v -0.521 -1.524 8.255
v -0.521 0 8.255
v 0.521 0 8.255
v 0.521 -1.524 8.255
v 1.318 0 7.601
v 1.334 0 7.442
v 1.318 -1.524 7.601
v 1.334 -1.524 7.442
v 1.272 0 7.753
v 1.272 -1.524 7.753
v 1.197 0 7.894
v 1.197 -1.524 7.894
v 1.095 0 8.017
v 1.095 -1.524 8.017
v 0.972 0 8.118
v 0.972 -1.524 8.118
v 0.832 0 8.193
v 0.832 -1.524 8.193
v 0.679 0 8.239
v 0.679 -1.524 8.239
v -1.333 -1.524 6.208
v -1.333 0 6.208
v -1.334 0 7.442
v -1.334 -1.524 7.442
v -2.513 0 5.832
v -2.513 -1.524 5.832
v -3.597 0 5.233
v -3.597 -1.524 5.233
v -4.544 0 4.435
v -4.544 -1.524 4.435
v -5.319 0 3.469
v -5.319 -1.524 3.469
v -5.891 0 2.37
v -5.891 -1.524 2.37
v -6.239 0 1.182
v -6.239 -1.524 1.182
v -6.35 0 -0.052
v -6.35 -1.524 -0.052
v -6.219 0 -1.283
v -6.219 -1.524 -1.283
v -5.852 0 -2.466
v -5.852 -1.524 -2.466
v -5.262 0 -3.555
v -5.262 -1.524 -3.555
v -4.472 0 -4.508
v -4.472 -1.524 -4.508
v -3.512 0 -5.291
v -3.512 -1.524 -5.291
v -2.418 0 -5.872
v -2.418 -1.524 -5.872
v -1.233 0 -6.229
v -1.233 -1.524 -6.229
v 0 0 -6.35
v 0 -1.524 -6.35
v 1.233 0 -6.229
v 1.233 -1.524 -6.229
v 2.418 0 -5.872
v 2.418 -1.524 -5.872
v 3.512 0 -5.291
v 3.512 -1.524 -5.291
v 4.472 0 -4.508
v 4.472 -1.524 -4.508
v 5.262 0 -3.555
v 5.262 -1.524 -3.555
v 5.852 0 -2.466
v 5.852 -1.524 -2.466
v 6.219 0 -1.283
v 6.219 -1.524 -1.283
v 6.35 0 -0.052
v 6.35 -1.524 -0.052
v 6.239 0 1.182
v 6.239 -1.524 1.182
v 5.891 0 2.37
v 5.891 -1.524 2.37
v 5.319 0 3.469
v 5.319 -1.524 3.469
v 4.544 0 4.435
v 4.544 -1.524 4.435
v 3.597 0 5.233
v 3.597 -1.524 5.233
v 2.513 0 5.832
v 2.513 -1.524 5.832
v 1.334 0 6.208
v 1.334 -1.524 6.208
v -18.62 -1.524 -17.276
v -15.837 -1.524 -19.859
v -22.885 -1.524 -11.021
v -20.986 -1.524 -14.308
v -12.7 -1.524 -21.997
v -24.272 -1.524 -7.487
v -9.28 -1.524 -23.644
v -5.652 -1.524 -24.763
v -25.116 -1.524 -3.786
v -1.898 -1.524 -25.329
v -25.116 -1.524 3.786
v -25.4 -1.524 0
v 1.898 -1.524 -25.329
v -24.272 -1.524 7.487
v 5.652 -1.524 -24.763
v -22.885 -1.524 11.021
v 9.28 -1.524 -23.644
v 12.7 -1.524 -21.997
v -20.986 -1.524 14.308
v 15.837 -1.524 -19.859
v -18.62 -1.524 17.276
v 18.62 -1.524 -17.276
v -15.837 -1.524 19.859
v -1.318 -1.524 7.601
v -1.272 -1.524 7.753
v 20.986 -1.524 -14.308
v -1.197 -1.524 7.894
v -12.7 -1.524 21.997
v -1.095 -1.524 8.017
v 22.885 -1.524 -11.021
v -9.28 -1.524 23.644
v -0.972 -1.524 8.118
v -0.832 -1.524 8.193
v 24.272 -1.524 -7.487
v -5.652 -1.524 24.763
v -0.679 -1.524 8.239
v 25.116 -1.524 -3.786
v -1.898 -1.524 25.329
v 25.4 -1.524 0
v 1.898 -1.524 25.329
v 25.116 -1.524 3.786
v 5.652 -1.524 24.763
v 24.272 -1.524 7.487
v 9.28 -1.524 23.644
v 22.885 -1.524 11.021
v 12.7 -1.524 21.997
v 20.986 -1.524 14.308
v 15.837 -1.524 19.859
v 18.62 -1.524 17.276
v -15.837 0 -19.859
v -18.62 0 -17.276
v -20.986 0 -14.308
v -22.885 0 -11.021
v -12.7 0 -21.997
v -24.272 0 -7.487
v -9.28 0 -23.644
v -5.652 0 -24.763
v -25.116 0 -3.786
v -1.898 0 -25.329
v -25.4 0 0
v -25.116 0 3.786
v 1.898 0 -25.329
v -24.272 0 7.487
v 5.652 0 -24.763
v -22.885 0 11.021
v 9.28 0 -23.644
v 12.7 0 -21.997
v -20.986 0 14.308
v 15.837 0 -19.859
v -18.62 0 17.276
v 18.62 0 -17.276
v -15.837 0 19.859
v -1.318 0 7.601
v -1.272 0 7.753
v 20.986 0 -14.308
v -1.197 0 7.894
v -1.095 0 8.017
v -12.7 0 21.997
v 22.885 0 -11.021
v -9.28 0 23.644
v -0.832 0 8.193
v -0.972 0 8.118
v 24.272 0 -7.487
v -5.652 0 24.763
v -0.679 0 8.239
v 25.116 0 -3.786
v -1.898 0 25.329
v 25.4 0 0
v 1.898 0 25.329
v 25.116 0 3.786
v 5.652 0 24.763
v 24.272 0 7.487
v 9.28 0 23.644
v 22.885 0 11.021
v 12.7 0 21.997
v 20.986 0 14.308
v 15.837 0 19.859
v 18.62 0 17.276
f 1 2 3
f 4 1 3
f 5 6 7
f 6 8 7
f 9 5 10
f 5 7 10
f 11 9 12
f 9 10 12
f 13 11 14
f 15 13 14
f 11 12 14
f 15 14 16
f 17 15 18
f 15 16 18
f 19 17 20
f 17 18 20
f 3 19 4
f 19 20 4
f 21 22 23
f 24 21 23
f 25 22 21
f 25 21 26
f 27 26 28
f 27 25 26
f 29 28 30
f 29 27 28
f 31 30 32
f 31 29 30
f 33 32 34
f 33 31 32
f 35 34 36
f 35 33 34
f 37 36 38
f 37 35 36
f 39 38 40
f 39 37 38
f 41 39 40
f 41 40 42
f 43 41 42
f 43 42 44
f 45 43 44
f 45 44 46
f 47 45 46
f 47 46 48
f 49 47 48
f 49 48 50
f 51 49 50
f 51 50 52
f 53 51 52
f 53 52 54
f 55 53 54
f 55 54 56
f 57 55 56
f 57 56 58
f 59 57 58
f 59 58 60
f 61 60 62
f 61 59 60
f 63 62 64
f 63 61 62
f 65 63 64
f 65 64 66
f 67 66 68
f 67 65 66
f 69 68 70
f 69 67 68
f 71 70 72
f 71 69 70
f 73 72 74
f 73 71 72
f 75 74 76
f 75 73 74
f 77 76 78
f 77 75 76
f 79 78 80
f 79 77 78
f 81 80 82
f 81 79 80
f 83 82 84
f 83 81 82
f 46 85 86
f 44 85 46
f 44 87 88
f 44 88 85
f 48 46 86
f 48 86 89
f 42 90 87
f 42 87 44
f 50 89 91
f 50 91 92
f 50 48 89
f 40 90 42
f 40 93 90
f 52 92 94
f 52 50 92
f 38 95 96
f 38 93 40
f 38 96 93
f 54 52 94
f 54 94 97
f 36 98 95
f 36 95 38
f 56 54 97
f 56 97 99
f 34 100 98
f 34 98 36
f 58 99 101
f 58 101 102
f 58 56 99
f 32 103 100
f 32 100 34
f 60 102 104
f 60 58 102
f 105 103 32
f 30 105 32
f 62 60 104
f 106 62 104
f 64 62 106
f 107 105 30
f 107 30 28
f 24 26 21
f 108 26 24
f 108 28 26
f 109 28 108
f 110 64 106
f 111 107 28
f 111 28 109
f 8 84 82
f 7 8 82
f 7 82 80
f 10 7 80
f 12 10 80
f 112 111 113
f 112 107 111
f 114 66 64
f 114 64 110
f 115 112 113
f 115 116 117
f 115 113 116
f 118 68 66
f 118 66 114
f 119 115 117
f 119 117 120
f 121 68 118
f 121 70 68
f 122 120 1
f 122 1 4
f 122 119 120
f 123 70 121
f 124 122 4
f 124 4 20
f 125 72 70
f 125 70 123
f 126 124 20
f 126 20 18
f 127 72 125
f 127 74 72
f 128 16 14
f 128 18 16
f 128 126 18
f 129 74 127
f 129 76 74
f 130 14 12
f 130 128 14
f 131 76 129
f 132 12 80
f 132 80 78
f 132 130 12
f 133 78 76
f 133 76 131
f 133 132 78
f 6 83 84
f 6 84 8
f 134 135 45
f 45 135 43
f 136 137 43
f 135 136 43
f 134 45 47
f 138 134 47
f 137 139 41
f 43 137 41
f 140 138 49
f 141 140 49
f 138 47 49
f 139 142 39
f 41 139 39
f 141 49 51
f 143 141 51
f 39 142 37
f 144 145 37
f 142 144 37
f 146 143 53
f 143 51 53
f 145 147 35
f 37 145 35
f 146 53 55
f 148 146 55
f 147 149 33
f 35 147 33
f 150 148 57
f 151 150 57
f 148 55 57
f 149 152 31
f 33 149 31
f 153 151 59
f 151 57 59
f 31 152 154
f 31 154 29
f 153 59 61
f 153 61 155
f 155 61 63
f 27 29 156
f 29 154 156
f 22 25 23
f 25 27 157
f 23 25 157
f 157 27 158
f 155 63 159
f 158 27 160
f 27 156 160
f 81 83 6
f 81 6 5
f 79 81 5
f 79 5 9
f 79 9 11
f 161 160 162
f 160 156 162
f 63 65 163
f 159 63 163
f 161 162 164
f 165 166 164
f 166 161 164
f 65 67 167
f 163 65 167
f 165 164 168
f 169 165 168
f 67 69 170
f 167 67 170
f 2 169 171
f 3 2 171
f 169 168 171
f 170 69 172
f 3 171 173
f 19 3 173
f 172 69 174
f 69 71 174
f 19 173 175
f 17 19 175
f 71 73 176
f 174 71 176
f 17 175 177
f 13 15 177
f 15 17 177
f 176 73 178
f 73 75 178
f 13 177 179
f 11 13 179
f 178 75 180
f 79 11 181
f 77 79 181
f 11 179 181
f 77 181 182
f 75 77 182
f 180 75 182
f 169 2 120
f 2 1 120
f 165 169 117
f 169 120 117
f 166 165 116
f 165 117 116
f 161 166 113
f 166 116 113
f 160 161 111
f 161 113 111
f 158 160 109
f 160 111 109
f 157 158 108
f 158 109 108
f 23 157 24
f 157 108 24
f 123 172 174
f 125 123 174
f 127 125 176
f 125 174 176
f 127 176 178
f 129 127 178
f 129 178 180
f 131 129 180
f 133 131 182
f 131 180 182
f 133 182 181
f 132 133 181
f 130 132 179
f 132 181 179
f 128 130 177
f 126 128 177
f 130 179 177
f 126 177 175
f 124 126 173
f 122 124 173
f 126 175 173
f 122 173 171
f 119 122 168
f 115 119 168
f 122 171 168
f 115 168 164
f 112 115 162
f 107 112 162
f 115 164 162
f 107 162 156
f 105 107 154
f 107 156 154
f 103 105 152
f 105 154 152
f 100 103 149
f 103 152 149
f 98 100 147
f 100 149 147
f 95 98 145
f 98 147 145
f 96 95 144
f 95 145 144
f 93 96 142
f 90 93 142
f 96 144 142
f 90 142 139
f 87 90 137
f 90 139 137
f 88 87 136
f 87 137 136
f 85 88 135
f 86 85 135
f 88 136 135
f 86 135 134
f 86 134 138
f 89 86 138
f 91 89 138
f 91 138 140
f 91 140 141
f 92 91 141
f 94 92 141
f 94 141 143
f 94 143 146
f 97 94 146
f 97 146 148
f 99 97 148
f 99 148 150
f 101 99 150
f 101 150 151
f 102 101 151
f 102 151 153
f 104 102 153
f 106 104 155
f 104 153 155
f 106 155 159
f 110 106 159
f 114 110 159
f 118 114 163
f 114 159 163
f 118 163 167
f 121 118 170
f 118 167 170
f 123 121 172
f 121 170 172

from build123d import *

# Parameters (mm, degrees)
F0_R     = 25.4
F0_R_2   = 6.35
F1_DEPTH = 1.524
F2_W     = 2.667
F2_H     = 8.255
F3_DEPTH = 73
F4_R     = 0.8128


# Not quite as in the source:
# - an extrude ends at something that could not be found from the text; its depth is read off the source's solid


with BuildPart() as f1:
    # F0 (on Front) → F1 (new body)
    with BuildSketch(Plane.XZ):
        Circle(F0_R)
        Circle(F0_R_2, mode=Mode.SUBTRACT)
    extrude(amount=F1_DEPTH)

    # F2 (on Front) → F3 (cut, through all)
    with BuildSketch(Plane.XZ):
        with Locations((0, 4.1275)):
            Rectangle(F2_W, F2_H)
    extrude(amount=F3_DEPTH, mode=Mode.SUBTRACT)

    # F4
    f4_edges = [f1.edges().sort_by_distance(p)[0] for p in [
        (-1.3335, -0.762, 8.255),
        (1.3335, -0.762, 8.255),
    ]]
    fillet(f4_edges, radius=F4_R)


solid = f1.part
